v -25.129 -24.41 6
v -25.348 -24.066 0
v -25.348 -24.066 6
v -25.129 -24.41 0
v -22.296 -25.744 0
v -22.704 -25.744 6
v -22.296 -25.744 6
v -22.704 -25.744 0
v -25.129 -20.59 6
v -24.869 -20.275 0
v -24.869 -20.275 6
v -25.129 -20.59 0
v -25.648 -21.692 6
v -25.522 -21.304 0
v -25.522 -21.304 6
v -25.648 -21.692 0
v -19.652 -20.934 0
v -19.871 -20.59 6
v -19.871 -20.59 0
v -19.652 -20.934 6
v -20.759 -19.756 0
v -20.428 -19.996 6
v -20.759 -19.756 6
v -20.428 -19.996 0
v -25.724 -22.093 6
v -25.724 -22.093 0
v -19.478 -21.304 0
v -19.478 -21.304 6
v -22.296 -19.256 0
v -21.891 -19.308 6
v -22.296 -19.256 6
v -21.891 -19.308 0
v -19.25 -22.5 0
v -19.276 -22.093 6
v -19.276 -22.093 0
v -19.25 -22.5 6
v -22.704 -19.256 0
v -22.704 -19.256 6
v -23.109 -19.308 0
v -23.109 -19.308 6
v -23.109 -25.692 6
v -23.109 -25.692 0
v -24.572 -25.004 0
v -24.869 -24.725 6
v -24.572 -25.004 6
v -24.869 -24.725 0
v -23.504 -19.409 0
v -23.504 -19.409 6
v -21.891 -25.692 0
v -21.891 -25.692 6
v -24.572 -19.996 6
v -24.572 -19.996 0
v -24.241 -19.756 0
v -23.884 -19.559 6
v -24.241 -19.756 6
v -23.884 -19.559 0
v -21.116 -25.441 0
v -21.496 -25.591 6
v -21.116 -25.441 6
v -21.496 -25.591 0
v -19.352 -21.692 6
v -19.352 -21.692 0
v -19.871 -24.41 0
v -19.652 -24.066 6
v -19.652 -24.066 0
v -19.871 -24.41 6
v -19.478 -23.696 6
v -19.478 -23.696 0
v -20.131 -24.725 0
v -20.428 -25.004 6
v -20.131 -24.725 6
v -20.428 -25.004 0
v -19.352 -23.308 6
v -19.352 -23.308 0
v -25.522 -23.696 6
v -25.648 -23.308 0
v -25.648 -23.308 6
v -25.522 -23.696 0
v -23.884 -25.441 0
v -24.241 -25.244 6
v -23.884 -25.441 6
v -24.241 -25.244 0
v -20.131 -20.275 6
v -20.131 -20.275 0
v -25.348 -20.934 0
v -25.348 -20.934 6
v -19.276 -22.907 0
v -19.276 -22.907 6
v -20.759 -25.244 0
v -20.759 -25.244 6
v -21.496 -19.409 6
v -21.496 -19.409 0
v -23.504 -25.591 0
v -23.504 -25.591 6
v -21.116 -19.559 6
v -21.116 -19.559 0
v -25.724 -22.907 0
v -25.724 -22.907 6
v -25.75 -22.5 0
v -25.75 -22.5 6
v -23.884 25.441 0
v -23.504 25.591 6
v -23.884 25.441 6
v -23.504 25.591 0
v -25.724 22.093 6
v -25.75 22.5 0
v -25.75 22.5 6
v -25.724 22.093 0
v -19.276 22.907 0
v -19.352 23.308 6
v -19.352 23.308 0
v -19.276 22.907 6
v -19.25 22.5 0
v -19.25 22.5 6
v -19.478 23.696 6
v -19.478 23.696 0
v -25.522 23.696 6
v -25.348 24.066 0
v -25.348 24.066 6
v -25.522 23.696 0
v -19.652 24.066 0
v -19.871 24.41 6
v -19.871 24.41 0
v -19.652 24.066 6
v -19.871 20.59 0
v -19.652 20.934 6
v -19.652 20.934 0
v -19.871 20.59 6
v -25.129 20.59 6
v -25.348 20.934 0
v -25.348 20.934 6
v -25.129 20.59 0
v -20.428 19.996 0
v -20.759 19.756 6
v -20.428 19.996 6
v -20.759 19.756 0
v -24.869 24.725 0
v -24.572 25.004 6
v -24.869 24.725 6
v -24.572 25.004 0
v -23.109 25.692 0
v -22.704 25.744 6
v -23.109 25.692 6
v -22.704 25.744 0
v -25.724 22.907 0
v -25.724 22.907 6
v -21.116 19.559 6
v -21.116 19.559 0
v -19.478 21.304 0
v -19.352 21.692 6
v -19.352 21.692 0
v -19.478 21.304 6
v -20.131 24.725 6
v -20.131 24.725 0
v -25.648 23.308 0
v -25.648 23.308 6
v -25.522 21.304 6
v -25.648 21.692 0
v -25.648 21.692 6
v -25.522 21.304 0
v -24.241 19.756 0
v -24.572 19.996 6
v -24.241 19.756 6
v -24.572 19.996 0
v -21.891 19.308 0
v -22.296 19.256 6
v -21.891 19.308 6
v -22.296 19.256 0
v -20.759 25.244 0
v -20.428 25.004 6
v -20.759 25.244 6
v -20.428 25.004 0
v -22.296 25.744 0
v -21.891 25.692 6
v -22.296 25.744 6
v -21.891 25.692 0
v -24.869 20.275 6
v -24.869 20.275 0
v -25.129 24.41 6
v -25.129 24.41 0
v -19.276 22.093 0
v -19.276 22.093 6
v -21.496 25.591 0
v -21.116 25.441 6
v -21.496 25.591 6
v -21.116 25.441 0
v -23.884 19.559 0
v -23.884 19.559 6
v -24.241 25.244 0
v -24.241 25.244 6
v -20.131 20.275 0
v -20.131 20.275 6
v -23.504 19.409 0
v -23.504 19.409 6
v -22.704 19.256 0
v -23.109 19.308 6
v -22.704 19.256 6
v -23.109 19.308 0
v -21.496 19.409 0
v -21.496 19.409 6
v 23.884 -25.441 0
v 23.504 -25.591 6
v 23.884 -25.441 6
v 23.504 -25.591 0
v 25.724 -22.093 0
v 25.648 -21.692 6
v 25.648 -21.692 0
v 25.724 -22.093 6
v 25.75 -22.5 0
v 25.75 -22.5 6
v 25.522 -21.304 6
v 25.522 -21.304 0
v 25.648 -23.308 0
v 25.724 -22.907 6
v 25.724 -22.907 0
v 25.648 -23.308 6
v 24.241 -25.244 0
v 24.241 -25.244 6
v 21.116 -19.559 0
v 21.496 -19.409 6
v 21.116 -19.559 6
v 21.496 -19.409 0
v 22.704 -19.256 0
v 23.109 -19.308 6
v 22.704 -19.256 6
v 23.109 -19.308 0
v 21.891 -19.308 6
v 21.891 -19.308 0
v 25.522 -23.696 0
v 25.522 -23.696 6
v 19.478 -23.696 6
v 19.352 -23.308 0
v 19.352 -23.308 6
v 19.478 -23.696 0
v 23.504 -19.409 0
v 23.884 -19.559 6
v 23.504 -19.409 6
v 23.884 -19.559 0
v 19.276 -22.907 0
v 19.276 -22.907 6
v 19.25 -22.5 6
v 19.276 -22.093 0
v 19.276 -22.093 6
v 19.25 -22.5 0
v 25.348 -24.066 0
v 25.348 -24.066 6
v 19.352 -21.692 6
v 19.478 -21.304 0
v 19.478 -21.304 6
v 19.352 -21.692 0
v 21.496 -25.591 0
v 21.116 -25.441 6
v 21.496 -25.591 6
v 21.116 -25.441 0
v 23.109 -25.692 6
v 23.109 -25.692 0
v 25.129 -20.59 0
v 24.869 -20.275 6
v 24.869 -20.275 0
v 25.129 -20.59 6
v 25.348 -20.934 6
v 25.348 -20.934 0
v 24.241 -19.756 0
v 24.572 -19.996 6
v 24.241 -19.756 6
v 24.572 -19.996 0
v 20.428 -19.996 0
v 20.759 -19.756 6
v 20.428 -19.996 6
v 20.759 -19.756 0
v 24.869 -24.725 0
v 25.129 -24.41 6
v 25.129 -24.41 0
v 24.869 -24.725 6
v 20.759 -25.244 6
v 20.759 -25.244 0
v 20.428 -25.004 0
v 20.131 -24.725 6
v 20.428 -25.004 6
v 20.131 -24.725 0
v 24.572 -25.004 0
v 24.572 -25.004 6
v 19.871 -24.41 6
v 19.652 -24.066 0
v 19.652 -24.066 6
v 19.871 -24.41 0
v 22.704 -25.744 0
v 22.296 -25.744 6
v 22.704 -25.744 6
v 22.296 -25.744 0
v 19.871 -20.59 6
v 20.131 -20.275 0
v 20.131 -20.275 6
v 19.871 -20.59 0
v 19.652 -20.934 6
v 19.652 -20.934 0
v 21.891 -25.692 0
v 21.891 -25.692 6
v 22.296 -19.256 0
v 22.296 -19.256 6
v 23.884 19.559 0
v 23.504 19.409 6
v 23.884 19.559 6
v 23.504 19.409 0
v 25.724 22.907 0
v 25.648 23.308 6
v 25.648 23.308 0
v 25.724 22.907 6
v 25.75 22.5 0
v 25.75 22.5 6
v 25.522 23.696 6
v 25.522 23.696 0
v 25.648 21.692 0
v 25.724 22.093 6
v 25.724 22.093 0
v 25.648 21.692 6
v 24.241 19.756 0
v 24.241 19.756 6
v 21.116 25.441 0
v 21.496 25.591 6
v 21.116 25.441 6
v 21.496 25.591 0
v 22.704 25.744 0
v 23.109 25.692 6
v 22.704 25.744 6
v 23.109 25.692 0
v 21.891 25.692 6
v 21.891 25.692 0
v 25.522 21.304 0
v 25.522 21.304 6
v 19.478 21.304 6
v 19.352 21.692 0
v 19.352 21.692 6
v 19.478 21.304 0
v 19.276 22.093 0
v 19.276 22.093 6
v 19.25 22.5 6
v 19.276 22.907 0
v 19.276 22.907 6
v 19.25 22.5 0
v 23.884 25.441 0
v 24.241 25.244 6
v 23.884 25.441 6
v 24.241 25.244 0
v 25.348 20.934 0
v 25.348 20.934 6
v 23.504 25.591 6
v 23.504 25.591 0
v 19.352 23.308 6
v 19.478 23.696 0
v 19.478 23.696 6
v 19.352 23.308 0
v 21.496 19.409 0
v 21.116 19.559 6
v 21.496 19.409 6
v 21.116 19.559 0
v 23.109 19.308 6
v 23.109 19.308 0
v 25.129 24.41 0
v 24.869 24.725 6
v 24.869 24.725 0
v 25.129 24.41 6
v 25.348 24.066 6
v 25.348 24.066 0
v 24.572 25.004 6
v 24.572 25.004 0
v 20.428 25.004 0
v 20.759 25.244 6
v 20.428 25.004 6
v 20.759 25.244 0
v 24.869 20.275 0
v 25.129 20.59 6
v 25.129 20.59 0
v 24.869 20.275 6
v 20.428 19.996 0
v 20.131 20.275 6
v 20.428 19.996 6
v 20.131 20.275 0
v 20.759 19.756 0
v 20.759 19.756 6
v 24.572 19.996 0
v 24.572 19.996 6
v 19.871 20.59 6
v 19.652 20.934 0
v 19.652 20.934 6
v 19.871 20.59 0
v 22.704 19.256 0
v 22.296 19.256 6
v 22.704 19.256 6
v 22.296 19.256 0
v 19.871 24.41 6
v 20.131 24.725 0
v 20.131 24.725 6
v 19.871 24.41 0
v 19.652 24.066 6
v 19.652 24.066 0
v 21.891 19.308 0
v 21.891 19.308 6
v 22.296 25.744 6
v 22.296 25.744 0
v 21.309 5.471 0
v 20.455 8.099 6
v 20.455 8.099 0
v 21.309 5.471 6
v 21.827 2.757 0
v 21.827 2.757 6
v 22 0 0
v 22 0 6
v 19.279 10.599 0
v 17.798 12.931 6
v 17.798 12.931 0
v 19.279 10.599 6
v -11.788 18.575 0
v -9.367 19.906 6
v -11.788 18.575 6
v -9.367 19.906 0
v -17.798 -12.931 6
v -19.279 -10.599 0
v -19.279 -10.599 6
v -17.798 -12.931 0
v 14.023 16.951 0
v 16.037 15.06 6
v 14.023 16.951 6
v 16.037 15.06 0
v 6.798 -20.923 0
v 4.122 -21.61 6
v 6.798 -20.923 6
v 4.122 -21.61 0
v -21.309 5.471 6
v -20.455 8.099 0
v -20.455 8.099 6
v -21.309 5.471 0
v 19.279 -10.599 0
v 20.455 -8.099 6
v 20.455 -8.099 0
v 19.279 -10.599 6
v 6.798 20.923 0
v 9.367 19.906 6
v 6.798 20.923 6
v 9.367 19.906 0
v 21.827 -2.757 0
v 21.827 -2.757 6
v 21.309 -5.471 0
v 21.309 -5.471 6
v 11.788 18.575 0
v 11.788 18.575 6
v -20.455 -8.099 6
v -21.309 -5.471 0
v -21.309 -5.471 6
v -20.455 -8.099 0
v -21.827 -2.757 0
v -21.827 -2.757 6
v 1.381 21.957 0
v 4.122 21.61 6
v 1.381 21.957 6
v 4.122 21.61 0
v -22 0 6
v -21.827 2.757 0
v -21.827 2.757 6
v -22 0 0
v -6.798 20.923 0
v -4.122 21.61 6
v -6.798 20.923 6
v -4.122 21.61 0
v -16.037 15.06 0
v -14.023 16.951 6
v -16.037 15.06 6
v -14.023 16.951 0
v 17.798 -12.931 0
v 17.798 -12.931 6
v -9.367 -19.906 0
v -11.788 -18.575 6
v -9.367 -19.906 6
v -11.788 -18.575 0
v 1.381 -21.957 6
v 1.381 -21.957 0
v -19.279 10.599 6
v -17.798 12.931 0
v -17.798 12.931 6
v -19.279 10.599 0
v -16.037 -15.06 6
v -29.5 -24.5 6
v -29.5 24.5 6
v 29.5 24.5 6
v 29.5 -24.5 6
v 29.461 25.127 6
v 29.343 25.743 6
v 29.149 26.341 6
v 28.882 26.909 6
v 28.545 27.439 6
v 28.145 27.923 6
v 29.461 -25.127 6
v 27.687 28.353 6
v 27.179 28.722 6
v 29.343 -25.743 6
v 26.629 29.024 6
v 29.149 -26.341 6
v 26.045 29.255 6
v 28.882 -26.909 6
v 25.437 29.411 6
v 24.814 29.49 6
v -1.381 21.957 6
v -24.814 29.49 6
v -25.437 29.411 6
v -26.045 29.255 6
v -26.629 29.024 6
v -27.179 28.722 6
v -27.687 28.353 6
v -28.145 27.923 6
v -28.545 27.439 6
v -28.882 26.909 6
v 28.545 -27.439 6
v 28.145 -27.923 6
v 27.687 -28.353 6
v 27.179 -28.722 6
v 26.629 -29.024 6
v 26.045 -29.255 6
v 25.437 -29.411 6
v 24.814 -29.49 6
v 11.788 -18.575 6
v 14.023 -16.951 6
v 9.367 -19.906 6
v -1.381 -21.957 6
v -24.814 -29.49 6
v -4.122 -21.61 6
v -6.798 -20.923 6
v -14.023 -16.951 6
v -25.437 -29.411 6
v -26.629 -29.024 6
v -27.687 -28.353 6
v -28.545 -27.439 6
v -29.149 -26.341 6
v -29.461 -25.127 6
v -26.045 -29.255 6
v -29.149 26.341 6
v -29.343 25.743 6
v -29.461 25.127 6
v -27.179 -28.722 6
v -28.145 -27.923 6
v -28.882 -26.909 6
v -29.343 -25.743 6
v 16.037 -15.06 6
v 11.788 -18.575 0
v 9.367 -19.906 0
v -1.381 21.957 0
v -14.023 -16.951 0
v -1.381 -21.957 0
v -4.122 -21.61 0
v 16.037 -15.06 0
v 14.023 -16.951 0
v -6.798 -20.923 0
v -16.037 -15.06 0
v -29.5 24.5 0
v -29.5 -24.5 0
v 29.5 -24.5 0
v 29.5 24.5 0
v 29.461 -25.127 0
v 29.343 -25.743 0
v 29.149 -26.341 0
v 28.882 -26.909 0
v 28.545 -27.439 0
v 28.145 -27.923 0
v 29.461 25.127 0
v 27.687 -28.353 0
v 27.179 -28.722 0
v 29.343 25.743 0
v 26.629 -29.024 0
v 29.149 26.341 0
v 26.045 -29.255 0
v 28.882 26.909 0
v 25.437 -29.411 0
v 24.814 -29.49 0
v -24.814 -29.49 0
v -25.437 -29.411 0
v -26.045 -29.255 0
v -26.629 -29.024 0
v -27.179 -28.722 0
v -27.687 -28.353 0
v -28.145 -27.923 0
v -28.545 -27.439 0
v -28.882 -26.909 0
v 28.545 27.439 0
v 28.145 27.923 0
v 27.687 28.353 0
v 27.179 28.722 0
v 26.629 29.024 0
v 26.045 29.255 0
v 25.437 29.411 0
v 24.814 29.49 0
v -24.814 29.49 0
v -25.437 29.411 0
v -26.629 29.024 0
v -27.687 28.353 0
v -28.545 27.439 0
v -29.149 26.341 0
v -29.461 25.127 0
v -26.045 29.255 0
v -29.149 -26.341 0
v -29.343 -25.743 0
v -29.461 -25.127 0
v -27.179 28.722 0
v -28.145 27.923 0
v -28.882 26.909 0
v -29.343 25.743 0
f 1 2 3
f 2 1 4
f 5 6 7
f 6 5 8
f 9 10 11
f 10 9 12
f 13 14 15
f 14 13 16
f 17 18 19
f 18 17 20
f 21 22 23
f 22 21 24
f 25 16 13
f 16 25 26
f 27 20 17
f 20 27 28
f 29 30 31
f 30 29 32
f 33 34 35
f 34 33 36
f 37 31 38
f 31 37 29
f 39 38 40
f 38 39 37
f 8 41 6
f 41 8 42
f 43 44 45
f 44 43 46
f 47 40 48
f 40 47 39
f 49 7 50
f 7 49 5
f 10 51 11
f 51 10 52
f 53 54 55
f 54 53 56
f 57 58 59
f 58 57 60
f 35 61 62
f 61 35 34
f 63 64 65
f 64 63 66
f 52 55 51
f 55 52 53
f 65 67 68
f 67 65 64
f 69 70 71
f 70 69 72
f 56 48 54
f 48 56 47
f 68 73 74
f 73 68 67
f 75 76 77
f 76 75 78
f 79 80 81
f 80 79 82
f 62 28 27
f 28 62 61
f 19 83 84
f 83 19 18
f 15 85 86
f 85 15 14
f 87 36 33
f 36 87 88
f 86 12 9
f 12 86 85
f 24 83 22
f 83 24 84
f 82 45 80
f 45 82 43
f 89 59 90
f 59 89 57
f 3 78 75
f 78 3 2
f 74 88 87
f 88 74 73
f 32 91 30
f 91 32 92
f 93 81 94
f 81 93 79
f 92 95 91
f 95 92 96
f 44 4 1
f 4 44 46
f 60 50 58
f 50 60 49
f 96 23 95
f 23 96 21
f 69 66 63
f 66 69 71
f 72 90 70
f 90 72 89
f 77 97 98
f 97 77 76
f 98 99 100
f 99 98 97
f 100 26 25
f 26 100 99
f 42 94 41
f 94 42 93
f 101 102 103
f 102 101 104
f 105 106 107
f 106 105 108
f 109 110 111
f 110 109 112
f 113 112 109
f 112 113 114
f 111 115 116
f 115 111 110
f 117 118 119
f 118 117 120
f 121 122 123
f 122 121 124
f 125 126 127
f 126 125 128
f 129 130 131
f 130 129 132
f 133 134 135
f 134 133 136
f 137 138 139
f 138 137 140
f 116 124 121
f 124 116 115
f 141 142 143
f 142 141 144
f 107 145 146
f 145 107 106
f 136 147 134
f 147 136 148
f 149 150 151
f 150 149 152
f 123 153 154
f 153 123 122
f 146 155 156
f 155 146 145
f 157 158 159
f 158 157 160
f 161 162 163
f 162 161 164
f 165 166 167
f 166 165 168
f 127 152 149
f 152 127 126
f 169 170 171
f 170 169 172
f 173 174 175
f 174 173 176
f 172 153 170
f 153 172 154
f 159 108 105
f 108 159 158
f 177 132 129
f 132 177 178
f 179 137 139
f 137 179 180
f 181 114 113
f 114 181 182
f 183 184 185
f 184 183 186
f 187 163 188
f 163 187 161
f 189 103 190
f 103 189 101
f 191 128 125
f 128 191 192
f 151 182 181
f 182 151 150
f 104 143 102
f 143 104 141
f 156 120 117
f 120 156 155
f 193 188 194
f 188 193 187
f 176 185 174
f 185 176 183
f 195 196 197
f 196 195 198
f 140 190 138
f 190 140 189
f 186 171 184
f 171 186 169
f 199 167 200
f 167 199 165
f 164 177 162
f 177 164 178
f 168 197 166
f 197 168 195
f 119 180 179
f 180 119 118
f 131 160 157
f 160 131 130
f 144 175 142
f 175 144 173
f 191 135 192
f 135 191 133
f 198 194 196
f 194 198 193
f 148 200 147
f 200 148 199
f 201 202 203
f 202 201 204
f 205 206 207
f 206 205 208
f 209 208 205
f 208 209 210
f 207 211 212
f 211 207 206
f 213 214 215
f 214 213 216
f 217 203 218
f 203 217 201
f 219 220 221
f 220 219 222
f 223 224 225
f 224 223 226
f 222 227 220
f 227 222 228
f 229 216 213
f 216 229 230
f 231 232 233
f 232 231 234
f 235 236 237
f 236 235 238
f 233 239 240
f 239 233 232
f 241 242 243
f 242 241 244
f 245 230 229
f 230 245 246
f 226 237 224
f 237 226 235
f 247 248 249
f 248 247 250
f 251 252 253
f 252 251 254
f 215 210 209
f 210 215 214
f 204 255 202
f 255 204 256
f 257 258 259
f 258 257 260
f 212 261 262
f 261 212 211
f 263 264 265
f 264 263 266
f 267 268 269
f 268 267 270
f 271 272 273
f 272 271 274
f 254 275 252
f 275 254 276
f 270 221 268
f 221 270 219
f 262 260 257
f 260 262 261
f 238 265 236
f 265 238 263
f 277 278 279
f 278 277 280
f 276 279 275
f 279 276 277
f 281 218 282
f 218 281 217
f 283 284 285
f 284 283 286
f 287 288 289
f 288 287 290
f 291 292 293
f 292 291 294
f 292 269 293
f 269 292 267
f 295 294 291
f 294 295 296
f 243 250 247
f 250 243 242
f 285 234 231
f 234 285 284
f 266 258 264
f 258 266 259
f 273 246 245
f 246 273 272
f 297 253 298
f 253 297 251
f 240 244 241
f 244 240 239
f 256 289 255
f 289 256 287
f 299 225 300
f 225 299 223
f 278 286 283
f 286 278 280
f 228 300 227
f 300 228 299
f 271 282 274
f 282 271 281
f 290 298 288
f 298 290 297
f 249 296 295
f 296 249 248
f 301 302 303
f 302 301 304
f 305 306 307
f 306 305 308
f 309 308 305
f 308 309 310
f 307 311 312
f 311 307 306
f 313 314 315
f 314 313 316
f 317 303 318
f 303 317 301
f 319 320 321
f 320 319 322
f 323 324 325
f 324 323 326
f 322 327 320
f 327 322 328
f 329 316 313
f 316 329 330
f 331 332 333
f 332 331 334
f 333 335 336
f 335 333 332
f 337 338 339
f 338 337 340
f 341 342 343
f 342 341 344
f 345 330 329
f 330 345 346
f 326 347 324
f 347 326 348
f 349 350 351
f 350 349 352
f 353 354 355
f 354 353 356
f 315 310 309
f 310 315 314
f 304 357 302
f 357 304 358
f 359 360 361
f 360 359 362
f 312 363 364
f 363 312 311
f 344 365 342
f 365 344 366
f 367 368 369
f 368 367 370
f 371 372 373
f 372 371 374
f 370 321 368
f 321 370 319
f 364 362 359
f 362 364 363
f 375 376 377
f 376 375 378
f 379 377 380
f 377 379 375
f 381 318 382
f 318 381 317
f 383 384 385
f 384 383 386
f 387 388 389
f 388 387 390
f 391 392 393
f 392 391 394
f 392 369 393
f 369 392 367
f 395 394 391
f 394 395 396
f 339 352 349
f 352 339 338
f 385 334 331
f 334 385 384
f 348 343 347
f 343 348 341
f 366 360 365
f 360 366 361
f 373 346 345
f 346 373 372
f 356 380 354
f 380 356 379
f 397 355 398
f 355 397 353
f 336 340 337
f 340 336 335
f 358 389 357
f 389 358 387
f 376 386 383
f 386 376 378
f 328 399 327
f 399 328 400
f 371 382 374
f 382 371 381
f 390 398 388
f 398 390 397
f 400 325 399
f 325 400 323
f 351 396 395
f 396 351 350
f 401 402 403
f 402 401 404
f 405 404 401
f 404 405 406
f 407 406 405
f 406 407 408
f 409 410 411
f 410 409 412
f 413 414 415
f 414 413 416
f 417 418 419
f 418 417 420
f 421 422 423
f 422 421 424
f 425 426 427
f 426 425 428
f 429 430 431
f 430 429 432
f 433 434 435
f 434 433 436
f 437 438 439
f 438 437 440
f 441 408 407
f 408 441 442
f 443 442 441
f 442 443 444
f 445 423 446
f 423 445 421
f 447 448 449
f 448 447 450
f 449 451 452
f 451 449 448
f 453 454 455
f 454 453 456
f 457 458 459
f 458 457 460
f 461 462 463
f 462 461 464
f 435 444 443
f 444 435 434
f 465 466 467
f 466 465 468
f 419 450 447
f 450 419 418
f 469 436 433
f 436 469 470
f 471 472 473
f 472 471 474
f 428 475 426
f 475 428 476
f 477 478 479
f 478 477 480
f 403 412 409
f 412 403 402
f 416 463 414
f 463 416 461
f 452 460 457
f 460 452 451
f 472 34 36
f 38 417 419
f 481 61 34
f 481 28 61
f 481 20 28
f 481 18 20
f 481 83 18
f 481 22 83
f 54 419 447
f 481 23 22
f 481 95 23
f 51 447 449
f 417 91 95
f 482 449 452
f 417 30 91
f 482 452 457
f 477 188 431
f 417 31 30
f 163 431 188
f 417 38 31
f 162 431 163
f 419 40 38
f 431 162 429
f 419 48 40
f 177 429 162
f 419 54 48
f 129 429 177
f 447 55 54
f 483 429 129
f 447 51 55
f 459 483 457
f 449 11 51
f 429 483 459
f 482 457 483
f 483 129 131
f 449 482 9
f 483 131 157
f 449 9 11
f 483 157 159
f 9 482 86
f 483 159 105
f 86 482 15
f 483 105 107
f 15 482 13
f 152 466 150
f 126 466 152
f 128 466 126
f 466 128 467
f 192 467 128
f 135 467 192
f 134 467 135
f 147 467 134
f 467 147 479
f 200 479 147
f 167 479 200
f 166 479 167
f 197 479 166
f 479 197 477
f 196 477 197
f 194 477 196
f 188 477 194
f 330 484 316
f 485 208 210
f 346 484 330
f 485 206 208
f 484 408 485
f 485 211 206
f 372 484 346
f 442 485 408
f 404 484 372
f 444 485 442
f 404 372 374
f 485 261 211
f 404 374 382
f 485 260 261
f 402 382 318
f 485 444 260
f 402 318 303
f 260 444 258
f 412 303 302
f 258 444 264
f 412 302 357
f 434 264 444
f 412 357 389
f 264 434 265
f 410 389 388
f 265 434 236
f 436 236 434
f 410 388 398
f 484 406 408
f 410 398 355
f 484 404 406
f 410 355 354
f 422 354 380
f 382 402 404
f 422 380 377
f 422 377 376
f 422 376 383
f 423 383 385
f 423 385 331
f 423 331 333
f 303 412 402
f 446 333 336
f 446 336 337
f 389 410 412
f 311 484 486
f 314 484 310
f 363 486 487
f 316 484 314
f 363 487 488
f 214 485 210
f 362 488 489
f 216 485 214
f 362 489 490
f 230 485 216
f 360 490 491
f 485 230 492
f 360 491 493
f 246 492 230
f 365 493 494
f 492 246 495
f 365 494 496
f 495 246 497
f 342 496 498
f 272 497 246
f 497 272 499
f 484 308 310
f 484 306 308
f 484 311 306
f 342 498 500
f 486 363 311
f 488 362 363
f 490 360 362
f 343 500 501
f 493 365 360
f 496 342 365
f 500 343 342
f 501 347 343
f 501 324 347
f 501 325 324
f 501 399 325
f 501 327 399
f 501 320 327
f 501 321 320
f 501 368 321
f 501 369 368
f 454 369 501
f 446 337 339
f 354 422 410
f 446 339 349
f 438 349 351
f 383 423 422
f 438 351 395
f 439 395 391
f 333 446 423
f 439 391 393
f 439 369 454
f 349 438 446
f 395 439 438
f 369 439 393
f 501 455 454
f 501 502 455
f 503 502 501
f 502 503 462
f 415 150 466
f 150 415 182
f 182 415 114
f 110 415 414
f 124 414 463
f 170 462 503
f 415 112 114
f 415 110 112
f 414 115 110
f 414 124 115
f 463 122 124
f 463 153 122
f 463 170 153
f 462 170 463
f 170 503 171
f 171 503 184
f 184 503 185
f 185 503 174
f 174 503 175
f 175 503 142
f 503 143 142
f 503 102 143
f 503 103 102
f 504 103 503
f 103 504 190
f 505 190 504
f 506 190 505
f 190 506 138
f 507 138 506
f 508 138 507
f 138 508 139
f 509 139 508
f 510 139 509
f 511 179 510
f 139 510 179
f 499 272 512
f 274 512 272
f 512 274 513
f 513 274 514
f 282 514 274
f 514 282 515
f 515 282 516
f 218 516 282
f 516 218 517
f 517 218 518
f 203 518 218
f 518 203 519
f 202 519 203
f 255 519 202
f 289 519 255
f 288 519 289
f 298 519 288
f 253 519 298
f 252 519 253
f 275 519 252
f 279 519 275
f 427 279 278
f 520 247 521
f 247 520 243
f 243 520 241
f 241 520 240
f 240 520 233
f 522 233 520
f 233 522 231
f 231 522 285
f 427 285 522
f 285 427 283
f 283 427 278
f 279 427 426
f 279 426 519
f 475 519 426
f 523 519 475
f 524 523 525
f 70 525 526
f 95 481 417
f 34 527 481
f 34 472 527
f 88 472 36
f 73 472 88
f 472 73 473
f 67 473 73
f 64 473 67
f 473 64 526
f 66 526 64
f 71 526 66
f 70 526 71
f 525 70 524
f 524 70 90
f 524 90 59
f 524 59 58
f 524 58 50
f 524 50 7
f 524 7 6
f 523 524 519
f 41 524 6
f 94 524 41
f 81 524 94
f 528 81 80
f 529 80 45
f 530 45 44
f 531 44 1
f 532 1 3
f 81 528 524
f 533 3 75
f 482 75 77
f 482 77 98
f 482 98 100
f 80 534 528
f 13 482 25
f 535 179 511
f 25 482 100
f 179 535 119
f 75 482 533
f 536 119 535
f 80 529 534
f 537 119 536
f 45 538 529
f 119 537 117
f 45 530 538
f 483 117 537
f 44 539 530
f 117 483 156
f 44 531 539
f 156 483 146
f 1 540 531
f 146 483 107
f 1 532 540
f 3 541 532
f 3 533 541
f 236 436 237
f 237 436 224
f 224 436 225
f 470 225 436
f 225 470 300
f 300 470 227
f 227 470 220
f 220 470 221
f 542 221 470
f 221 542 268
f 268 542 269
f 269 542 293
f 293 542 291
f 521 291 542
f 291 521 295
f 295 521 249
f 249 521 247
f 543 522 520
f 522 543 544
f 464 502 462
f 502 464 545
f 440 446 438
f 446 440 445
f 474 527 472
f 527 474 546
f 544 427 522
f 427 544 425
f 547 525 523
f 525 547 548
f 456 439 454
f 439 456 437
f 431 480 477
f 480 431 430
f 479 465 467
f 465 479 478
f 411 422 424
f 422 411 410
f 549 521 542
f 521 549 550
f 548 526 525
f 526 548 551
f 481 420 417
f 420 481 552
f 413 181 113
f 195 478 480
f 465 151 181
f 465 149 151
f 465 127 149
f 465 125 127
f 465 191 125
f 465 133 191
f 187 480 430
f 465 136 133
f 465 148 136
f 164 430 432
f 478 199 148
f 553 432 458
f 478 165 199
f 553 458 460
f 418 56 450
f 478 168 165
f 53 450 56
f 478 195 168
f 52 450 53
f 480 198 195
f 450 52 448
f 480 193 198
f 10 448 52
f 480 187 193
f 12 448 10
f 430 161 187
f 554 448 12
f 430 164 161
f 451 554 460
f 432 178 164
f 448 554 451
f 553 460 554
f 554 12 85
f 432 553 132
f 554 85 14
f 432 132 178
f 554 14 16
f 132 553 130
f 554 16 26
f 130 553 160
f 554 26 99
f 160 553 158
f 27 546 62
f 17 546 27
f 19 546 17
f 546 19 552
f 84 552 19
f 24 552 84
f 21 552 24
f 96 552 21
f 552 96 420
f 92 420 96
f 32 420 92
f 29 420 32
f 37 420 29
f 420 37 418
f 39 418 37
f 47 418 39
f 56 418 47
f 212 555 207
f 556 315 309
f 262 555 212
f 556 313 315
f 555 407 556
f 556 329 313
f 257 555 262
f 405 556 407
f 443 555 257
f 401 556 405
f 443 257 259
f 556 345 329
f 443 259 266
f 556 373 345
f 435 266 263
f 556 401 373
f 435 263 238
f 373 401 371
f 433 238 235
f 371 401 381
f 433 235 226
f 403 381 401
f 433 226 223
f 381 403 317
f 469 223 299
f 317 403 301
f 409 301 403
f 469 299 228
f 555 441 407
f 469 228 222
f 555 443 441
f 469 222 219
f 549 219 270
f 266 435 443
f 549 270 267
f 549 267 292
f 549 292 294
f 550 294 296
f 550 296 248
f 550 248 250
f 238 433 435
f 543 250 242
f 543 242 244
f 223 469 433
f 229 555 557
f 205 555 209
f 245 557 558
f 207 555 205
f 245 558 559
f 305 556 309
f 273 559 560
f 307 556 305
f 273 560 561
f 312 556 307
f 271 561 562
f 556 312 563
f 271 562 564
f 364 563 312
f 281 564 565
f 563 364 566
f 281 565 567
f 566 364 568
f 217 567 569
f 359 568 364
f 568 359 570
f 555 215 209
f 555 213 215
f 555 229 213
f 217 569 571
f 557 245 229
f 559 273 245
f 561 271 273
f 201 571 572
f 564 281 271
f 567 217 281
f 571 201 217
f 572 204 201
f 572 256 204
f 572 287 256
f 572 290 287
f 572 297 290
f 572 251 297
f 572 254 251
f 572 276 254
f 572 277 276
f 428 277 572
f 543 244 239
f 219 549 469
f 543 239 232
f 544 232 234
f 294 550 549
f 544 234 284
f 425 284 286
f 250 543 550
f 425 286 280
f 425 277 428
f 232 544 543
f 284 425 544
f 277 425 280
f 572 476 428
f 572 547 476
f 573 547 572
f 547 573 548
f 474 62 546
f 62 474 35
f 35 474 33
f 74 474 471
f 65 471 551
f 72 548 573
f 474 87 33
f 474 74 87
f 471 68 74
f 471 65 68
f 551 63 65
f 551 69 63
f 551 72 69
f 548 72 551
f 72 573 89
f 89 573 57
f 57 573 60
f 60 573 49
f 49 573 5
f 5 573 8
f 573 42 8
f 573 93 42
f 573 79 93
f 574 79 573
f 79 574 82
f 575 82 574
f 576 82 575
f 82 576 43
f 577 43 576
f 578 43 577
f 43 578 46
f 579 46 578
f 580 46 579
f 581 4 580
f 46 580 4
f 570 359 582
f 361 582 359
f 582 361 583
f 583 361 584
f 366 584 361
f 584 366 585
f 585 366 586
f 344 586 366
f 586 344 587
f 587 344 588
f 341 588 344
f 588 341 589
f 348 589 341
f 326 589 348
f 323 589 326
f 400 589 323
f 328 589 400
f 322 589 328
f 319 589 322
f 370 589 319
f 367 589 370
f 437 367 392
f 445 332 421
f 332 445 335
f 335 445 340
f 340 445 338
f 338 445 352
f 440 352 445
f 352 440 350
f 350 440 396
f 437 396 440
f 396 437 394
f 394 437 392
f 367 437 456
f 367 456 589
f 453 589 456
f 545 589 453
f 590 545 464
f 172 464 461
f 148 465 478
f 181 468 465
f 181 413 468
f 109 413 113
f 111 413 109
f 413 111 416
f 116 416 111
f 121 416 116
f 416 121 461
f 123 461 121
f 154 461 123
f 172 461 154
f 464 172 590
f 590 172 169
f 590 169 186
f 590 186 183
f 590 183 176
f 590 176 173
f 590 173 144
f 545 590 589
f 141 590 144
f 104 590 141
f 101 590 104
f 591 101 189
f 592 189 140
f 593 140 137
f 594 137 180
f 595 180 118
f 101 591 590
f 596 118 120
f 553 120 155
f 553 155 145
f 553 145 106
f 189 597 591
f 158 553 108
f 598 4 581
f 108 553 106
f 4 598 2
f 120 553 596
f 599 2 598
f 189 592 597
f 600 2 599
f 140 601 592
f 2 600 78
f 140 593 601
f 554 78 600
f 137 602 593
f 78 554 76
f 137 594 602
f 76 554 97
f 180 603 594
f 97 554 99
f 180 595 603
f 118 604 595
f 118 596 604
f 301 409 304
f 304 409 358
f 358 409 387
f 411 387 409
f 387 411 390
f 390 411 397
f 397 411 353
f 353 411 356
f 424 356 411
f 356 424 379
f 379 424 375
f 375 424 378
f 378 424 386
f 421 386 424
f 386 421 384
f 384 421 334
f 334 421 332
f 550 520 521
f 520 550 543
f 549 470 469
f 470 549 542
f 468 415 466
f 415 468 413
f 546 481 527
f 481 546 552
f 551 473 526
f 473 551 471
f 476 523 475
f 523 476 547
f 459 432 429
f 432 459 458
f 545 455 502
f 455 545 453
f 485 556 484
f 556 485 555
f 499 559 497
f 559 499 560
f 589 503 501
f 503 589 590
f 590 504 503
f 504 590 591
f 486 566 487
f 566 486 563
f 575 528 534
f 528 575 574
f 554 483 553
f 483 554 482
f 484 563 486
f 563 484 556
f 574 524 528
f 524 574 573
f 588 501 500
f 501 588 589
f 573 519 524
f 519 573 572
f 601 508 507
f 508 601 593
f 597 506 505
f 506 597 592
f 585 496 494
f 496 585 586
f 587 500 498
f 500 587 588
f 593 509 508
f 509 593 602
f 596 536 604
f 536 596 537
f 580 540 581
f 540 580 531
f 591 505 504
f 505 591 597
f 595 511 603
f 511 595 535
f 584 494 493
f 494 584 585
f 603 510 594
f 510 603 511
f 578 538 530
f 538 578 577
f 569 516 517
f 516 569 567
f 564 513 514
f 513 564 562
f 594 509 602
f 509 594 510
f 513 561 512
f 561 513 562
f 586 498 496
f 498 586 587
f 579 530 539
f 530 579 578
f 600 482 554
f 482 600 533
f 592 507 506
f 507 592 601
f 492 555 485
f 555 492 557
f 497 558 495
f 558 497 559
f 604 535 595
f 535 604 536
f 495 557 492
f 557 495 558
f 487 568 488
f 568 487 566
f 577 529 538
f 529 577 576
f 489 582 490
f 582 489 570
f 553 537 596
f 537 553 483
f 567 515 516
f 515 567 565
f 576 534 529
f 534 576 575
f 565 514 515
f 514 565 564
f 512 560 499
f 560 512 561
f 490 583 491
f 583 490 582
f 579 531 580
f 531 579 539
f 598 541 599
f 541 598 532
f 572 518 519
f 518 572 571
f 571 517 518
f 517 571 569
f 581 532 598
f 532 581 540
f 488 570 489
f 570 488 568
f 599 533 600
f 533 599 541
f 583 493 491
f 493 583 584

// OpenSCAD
$fn = 50;


difference() {
	union() {
		hull() {
			translate(v = [-24.5000000000, 24.5000000000, 0]) {
				cylinder(h = 6, r = 5);
			}
			translate(v = [24.5000000000, 24.5000000000, 0]) {
				cylinder(h = 6, r = 5);
			}
			translate(v = [-24.5000000000, -24.5000000000, 0]) {
				cylinder(h = 6, r = 5);
			}
			translate(v = [24.5000000000, -24.5000000000, 0]) {
				cylinder(h = 6, r = 5);
			}
		}
	}
	union() {
		#translate(v = [-22.5000000000, -22.5000000000, -100.0000000000]) {
			cylinder(h = 200, r = 3.2500000000);
		}
		#translate(v = [-22.5000000000, 22.5000000000, -100.0000000000]) {
			cylinder(h = 200, r = 3.2500000000);
		}
		#translate(v = [22.5000000000, -22.5000000000, -100.0000000000]) {
			cylinder(h = 200, r = 3.2500000000);
		}
		#translate(v = [22.5000000000, 22.5000000000, -100.0000000000]) {
			cylinder(h = 200, r = 3.2500000000);
		}
		#cylinder(h = 6, r = 22.0000000000);
	}
}
